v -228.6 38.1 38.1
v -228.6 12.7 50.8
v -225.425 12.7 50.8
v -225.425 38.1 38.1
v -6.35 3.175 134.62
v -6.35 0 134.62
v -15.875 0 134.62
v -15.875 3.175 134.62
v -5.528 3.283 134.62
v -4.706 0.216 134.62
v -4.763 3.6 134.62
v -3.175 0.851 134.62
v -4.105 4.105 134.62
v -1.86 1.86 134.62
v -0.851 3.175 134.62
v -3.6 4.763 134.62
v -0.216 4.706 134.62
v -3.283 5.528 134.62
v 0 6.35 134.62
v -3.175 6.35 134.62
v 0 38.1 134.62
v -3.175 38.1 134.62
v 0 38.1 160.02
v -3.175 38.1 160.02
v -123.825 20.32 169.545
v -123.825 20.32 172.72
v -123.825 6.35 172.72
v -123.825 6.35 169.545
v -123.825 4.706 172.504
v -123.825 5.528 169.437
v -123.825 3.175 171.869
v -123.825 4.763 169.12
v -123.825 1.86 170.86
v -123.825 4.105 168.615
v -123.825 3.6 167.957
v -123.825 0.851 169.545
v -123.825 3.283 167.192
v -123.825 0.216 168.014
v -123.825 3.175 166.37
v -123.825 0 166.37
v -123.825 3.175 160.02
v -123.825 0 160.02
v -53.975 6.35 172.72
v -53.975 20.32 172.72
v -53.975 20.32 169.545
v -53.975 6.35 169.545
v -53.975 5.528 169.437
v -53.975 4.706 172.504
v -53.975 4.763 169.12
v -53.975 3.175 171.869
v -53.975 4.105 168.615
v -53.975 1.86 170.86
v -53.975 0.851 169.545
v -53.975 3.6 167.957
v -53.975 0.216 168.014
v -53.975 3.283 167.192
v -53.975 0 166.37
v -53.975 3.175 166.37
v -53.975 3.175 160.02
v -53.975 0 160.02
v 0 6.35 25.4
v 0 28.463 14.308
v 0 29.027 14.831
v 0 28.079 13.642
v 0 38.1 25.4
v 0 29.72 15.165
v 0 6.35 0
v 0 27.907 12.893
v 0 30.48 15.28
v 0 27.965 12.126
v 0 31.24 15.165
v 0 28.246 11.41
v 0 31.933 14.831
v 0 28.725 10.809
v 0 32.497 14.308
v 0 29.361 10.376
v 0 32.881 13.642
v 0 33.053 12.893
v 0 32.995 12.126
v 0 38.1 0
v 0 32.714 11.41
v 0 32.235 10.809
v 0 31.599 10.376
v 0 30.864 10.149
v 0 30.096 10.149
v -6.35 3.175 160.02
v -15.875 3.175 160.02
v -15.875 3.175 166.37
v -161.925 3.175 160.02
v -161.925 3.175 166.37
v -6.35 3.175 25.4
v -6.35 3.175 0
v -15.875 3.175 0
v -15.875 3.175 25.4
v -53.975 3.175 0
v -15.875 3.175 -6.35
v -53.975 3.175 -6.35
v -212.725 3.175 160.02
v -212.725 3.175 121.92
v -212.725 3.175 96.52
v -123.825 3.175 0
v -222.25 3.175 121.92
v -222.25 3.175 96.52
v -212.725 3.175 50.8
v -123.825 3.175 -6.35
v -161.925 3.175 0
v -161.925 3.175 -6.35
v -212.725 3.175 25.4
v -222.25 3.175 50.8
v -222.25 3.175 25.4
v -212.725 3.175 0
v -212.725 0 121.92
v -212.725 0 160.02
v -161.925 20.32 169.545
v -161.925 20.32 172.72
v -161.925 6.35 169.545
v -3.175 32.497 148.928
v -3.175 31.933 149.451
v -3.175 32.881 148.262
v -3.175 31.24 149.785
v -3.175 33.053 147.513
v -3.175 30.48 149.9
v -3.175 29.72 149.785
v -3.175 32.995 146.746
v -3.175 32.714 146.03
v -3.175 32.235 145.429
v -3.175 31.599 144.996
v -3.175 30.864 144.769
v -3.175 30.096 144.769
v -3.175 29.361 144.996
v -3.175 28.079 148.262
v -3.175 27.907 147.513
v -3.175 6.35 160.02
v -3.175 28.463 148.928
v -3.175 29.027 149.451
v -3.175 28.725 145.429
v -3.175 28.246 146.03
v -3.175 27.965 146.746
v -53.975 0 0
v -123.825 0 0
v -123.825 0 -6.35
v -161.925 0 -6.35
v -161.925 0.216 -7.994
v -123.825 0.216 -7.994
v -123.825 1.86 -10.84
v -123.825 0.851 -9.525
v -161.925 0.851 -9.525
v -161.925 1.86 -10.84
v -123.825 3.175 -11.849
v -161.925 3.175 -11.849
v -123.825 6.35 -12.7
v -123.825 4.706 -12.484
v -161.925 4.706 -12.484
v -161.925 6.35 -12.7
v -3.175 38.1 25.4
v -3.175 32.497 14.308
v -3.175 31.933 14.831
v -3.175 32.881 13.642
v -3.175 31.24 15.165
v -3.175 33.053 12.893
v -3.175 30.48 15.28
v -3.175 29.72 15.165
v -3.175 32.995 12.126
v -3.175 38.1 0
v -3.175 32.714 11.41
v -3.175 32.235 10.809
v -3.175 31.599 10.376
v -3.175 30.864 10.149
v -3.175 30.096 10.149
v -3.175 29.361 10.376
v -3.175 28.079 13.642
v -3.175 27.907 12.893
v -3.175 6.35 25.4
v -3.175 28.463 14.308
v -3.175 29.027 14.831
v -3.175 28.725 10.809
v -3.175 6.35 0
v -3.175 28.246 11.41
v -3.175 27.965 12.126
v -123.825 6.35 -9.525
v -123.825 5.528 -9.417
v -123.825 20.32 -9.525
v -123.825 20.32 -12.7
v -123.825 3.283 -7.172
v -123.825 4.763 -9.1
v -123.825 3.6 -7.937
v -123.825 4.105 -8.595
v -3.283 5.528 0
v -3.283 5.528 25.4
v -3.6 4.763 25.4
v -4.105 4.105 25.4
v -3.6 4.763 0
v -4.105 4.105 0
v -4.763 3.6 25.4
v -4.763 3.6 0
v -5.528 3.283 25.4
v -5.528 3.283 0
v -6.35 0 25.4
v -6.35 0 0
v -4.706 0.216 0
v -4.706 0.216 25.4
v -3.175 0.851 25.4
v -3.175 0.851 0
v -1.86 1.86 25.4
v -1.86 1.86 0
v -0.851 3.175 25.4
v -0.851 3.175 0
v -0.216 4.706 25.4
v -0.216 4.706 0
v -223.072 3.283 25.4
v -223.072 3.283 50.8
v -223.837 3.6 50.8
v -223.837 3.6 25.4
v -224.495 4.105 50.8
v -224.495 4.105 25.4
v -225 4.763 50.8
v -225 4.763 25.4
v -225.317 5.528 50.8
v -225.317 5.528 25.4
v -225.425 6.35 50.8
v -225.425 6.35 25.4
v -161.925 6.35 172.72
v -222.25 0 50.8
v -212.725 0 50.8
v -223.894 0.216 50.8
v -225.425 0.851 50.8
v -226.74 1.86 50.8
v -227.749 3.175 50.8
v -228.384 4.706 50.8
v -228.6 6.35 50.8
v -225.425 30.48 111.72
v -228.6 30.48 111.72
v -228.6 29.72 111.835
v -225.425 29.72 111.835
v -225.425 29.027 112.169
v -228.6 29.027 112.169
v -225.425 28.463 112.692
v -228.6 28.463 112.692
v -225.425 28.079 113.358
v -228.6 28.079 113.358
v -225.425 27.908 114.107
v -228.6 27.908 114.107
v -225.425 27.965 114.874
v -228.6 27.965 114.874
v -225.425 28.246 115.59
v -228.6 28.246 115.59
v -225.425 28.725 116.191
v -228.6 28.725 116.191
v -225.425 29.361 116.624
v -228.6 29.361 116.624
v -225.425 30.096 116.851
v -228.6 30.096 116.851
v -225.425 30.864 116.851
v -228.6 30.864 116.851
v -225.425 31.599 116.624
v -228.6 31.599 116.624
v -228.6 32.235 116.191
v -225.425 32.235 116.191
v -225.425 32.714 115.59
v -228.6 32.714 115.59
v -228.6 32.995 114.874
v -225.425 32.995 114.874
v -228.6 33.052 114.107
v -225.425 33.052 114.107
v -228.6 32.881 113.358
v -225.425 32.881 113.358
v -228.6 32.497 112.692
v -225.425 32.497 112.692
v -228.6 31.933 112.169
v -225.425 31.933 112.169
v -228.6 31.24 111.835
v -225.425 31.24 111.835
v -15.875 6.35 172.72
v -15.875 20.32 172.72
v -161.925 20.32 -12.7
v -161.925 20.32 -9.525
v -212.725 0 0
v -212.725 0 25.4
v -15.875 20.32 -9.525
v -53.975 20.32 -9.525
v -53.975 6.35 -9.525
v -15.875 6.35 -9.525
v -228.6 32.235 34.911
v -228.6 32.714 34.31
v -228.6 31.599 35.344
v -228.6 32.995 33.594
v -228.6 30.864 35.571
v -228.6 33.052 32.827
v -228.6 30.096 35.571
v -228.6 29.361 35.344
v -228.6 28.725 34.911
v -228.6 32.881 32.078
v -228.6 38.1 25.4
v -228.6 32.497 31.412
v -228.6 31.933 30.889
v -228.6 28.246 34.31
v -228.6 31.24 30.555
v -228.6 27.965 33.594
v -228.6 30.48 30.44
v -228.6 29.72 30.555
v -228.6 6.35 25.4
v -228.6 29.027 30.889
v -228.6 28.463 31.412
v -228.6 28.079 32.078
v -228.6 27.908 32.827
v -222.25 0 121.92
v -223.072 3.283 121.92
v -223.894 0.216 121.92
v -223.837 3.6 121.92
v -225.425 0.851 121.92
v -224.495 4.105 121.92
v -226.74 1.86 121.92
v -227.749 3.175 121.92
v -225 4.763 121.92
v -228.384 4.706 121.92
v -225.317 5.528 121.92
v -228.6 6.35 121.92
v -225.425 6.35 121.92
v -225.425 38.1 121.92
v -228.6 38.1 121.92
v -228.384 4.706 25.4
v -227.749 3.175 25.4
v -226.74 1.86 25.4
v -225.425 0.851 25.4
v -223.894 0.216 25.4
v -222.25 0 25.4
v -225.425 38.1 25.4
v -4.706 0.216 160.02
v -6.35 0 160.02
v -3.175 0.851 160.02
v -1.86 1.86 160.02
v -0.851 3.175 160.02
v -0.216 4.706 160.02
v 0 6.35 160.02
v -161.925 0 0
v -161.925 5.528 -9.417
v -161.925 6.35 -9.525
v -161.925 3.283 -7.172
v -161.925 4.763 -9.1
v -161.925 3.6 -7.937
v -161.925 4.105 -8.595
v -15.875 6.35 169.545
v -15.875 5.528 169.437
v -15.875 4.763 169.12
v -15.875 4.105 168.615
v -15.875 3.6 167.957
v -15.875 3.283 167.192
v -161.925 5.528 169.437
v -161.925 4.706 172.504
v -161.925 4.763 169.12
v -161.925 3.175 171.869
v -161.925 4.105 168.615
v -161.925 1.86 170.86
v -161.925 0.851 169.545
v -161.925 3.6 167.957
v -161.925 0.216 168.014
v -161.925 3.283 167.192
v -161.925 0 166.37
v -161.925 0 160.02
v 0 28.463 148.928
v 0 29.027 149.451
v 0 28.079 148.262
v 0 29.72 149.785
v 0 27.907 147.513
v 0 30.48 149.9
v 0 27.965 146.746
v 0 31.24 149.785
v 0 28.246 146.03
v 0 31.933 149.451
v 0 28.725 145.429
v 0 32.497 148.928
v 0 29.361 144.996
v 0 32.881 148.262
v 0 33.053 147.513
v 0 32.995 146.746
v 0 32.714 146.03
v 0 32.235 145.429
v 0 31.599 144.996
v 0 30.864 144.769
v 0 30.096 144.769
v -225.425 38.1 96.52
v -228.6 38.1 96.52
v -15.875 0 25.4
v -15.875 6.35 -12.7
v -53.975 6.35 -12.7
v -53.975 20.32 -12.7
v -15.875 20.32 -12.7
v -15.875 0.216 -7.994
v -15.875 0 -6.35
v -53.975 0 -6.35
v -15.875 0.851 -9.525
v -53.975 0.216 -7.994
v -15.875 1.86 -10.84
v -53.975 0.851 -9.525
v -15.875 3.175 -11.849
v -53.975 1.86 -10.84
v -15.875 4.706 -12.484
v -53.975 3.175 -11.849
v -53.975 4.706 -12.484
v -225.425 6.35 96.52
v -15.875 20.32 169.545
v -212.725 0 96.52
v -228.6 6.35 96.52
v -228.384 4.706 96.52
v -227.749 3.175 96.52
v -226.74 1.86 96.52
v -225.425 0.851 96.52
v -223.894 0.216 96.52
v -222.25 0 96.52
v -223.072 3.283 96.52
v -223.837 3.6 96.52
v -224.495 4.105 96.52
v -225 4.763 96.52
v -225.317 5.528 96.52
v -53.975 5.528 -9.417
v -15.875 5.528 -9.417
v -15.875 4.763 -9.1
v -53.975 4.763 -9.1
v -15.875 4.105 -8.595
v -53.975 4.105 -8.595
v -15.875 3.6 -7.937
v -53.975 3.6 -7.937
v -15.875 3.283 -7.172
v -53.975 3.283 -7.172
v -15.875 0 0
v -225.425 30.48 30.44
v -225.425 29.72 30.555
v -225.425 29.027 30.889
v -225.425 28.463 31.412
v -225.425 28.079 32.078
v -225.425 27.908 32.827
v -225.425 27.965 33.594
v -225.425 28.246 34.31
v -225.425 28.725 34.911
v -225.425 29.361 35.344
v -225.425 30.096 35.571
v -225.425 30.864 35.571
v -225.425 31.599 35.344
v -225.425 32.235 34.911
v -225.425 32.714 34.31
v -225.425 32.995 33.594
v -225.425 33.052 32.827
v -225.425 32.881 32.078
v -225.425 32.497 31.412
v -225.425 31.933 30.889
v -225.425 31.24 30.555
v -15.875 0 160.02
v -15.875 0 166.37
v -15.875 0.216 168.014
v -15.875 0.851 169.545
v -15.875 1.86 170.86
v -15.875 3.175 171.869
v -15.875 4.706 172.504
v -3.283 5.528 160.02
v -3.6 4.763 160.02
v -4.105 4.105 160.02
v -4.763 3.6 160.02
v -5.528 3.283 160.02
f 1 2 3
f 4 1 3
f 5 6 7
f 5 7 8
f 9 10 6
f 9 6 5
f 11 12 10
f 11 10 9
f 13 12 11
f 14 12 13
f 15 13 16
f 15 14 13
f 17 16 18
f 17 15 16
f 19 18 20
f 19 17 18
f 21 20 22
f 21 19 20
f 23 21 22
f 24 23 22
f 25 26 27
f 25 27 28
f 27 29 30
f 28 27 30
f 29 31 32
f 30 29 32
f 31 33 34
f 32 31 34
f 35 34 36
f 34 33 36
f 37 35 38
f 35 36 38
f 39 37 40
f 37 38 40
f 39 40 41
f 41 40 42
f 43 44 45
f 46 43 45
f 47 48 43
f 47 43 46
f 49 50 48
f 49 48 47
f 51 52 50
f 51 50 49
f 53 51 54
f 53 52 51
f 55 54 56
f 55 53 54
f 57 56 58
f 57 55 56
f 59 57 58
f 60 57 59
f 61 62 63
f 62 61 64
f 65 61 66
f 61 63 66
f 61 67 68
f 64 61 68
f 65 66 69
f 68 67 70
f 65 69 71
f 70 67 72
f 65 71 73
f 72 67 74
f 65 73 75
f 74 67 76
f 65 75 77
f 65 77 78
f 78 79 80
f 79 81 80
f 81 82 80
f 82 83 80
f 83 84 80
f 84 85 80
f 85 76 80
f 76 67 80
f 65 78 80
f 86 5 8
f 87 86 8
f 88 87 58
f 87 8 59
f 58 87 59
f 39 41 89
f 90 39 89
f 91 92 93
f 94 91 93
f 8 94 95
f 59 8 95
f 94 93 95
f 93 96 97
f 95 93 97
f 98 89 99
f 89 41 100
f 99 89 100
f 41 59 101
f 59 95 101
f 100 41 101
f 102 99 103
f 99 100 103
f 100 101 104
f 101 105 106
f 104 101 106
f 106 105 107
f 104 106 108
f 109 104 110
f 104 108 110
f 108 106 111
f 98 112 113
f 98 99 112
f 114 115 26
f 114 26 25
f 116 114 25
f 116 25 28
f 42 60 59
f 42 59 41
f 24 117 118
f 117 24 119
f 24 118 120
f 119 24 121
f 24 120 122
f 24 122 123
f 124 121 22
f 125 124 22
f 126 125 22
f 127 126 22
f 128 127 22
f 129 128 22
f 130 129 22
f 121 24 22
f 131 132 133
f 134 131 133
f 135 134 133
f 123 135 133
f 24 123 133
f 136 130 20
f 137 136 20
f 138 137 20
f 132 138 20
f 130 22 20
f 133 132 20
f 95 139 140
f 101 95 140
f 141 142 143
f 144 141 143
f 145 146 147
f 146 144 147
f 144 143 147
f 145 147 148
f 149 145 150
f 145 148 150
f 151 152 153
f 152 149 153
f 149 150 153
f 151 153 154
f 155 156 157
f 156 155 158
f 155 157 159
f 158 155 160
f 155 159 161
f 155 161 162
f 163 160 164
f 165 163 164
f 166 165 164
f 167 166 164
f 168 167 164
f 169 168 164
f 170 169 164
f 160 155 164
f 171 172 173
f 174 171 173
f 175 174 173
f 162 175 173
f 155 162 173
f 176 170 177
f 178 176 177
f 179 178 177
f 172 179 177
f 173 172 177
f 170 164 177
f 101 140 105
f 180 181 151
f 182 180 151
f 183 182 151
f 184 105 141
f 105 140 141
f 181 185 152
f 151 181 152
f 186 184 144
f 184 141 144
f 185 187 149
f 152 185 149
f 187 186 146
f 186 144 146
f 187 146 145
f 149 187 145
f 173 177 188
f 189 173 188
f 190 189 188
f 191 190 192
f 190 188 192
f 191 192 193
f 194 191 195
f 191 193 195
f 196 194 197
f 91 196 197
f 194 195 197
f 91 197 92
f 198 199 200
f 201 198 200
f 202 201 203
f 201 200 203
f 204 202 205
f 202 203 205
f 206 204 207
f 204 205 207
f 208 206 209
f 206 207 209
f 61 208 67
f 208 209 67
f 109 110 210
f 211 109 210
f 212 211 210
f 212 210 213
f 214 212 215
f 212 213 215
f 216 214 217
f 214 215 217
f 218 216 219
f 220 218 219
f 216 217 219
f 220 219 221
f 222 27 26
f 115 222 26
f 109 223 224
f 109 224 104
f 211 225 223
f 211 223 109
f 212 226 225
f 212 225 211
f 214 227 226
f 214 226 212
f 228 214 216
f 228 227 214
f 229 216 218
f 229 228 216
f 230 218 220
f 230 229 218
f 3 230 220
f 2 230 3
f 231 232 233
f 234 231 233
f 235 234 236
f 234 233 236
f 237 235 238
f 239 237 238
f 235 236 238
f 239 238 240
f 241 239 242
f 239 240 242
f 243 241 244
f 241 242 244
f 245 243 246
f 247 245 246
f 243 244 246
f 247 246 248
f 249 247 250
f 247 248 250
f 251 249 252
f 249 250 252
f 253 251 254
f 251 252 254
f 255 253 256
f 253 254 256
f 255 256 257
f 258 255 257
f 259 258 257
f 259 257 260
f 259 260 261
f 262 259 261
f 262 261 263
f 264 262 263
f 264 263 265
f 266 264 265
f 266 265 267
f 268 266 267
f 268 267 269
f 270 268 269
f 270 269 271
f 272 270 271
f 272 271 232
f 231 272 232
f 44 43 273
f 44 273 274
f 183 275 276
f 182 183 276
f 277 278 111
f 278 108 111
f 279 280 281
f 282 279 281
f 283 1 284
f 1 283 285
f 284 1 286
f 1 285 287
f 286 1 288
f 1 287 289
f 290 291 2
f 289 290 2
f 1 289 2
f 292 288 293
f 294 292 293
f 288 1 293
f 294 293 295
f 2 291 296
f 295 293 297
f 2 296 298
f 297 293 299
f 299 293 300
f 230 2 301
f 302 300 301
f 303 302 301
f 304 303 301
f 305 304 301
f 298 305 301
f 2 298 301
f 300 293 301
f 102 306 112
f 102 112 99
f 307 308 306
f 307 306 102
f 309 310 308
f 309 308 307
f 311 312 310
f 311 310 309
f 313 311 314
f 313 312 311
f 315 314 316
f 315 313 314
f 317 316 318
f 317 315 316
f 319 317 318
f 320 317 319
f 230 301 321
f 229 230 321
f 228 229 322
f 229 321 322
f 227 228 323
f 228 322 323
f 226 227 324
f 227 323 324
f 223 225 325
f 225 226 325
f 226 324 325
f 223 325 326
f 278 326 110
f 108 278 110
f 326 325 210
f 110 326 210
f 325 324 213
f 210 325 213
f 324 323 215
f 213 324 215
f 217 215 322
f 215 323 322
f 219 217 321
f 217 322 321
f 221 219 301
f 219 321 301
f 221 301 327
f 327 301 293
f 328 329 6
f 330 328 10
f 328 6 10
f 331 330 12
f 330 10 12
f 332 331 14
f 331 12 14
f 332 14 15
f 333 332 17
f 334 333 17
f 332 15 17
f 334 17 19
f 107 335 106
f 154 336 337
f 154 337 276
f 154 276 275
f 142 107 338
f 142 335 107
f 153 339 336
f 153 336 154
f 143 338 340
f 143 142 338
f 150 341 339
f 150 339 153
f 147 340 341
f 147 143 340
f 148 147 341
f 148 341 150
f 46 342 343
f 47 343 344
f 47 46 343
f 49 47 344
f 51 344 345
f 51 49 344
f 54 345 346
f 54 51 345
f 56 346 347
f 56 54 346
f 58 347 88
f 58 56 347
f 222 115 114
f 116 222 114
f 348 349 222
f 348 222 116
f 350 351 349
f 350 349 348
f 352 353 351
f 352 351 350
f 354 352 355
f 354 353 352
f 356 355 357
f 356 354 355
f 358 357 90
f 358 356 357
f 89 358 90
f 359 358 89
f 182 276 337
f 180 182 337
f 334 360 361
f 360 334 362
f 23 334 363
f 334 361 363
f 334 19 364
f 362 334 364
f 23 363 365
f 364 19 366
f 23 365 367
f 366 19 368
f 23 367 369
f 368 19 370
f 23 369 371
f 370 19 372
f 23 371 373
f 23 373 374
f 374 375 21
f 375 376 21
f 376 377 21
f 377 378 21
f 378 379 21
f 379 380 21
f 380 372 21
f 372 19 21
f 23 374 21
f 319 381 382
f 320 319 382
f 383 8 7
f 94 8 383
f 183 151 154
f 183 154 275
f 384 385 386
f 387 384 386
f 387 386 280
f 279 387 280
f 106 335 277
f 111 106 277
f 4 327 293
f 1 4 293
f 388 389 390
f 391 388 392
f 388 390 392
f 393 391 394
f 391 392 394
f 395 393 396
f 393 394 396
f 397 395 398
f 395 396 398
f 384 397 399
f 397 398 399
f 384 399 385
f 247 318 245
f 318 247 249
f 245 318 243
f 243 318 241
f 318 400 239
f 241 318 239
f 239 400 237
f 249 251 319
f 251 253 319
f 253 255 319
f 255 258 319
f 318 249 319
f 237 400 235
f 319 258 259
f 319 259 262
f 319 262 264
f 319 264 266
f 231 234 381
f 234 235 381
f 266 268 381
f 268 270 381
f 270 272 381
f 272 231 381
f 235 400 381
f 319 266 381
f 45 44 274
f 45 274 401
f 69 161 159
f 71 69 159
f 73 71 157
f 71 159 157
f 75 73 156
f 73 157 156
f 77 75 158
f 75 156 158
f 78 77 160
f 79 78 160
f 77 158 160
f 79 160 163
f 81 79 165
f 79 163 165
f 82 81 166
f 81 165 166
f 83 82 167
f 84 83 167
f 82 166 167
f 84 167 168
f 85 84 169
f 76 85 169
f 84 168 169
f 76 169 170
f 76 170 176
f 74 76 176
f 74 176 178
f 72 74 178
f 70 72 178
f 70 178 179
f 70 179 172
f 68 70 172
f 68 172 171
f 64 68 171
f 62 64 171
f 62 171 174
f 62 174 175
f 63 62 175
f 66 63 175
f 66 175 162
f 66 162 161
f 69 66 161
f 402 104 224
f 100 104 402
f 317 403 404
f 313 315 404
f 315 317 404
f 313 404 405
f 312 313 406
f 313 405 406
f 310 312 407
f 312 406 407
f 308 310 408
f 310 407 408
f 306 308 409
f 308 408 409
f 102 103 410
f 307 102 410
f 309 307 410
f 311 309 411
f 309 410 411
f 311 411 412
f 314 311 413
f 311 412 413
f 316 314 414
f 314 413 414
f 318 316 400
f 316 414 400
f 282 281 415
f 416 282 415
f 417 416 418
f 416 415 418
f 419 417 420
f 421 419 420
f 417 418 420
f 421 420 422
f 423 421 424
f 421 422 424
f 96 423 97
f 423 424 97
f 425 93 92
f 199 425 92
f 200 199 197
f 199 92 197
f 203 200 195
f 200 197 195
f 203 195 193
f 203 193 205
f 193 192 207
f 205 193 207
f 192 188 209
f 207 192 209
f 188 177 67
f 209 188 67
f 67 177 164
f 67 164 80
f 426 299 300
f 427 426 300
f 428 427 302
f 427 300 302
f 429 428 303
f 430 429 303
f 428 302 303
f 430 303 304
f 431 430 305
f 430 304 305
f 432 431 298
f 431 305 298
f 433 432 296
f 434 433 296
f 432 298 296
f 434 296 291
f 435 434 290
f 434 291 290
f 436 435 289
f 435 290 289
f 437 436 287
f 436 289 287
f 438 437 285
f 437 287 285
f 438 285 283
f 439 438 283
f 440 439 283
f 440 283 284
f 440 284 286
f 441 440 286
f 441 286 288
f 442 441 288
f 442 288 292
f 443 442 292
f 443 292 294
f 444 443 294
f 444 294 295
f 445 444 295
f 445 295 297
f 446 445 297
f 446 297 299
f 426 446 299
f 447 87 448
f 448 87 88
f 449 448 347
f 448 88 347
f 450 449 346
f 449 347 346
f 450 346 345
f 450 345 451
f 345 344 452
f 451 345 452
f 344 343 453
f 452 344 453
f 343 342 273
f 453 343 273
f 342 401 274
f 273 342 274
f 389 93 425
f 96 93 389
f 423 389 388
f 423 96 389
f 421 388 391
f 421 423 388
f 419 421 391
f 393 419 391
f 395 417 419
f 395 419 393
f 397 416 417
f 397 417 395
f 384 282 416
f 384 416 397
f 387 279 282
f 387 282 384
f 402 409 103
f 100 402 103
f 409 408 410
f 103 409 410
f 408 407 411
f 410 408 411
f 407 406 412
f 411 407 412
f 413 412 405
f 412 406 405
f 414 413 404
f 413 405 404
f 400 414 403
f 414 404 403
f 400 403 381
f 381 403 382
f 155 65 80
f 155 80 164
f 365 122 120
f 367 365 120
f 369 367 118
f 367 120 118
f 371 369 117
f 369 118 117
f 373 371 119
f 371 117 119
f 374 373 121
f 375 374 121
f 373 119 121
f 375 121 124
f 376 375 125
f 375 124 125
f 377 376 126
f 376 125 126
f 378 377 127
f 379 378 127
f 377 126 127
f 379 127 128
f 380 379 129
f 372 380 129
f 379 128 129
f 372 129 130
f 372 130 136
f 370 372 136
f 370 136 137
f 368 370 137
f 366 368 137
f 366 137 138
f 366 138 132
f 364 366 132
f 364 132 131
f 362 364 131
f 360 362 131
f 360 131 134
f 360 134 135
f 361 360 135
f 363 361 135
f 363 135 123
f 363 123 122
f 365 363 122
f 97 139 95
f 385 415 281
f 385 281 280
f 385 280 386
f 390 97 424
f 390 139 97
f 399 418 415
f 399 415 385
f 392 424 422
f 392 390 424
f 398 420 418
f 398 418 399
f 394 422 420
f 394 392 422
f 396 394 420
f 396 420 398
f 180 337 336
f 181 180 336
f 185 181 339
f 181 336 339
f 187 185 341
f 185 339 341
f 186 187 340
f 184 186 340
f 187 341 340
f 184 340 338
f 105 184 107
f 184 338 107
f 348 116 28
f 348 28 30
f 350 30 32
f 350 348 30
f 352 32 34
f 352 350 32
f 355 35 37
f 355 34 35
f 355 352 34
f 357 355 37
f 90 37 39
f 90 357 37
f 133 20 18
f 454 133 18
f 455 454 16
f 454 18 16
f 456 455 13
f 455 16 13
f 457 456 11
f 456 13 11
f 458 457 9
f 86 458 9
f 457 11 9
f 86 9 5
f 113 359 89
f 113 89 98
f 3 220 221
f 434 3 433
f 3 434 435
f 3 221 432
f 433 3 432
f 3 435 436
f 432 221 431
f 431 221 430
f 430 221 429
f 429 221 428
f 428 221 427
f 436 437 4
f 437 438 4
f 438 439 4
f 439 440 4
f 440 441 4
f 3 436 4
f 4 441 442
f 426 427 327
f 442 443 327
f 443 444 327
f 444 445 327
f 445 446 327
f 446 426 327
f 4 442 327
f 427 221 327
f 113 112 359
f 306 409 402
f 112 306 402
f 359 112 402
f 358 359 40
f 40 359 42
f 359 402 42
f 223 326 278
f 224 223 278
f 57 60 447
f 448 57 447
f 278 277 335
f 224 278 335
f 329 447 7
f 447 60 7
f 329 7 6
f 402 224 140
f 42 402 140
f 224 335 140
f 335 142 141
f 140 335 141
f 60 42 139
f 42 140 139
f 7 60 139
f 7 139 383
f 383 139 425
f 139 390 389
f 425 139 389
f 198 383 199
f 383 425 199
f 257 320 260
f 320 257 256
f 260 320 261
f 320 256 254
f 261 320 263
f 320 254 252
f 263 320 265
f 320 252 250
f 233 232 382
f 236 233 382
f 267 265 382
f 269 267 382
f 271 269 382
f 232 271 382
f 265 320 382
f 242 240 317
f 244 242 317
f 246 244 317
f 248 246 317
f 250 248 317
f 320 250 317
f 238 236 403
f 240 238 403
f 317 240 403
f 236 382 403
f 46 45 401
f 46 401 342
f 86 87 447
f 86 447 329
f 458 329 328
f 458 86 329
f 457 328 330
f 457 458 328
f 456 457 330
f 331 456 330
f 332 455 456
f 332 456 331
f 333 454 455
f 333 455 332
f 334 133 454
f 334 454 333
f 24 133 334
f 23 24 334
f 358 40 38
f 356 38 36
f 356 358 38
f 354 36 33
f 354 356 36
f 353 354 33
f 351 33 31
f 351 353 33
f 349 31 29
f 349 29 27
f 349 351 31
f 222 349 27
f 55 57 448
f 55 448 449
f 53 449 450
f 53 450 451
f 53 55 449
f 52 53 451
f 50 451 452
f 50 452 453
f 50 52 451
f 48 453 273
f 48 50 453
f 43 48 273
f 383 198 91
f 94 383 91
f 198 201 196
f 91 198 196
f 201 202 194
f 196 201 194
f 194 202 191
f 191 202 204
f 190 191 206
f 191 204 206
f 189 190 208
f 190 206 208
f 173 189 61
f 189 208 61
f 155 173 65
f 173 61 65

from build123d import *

# Parameters (mm, degrees)
BASE_FLANGE1_DEPTH               = 160.02
SKETCH17_W                       = 196.85
SKETCH17_H                       = 12.7
BOSS_EXTRUDE2_DEPTH              = 3.175
EDGE_FLANGE1_STRIP_W             = 19.05
EDGE_FLANGE1_STRIP_H             = 3.175
EDGE_FLANGE1_STRIP_CUT_DEPTH     = 196.85
EDGE_FLANGE1_DEPTH               = 196.85
CUT_EXTRUDE3_REACH               = 291.036
SKETCH24_R                       = 2.5796875
SKETCH24_W                       = 45.72
SKETCH24_H                       = 50.8
SKETCH24_W_2                     = 38.1
SKETCH24_W_3                     = 25.4
F_13_64_0_20313_DIAMETER_HOLE1_D = 5.159502
CUT_EXTRUDE4_REACH               = 291.036
SKETCH28_W                       = 109.22
SKETCH28_H                       = 50.8
SKETCH29_W                       = 69.85
SKETCH29_H                       = 12.7
SKETCH29_W_2                     = 50.8
CUT_EXTRUDE5_DEPTH               = 290.035929254
CHAMFER1_SIZE                    = 12.7
CHAMFER1_SIZE2                   = 25.4


# Sheet-metal steps are written as plain solids
with BuildPart() as part:
    # Sketch7 → Base-Flange1 (new body)
    with BuildSketch(Plane.XY):
        with BuildLine():
            Line((-228.6, 38.1), (-228.6, 6.35))
            ThreePointArc((-228.6, 6.35), (-226.740128061, 1.859871939), (-222.25, 0))
            Line((-222.25, 0), (-6.35, 0))
            ThreePointArc((-6.35, 0), (-1.859871939, 1.859871939), (0, 6.35))
            Line((0, 6.35), (0, 38.1))
            Line((0, 38.1), (-3.175, 38.1))
            Line((-3.175, 38.1), (-3.175, 6.35))
            ThreePointArc((-3.175, 6.35), (-4.10493597, 4.10493597), (-6.35, 3.175))
            Line((-6.35, 3.175), (-222.25, 3.175))
            ThreePointArc((-222.25, 3.175), (-224.49506403, 4.10493597), (-225.425, 6.35))
            Line((-225.425, 6.35), (-225.425, 38.1))
            Line((-225.425, 38.1), (-228.6, 38.1))
        make_face()
    extrude(amount=BASE_FLANGE1_DEPTH)

    # Sketch17 → Boss-Extrude2 (add)
    with BuildSketch(Plane(origin=(0, 3.175, 0), x_dir=(1, 0, 0), z_dir=(0, 1, 0))):
        with Locations((-114.3, -166.37)):
            Rectangle(SKETCH17_W, SKETCH17_H)
    boss_extrude2 = extrude(amount=-BOSS_EXTRUDE2_DEPTH)

    # Edge-Flange1 strip (across the edge) → Edge-Flange1 strip cut (cut)
    with BuildSketch(Plane(origin=(-212.725, 3.175, 172.72), x_dir=(0, 0, -1), z_dir=(1, 0, 0))):
        with Locations((-3.175, -1.5875)):
            Rectangle(EDGE_FLANGE1_STRIP_W, EDGE_FLANGE1_STRIP_H)
    edge_flange1_strip_cut = extrude(amount=EDGE_FLANGE1_STRIP_CUT_DEPTH, mode=Mode.SUBTRACT)

    # Edge-Flange1 section (across the edge) → Edge-Flange1 (add)
    with BuildSketch(Plane(origin=(-212.725, 3.175, 172.72), x_dir=(0, 0, -1), z_dir=(1, 0, 0))):
        with BuildLine():
            Line((0, 3.175), (0, 17.145))
            Line((0, 17.145), (3.175, 17.145))
            Line((3.175, 17.145), (3.175, 3.175))
            ThreePointArc((3.175, 3.175), (4.10493597, 0.92993597), (6.35, 0))
            Line((6.35, 0), (6.35, -3.175))
            ThreePointArc((6.35, -3.175), (1.859871939, -1.315128061), (0, 3.175))
        make_face()
    edge_flange1 = extrude(amount=EDGE_FLANGE1_DEPTH)

    # Mirror1: Boss-Extrude2, Edge-Flange1 strip cut, Edge-Flange1 across plane
    add(boss_extrude2.mirror(Plane.XY.offset(80.01)))
    add(edge_flange1_strip_cut.mirror(Plane.XY.offset(80.01)), mode=Mode.SUBTRACT)
    add(edge_flange1.mirror(Plane.XY.offset(80.01)))

    # Cut-Extrude3: up to this face of the body (flat: up to its plane)
    cut_extrude3_end = Plane(part.part.faces().sort_by_distance((-212.725, 2.935376879, 163.195))[0])
    # Sketch24 → Cut-Extrude3 (cut, up to the picked face)
    with BuildSketch(Plane.ZY.offset(228.6), mode=Mode.PRIVATE) as cut_extrude3_sk1:
        with Locations(Location((33.02, 30.48, 0), (0, 0, 180))):
            Circle(SKETCH24_R)
    cut_extrude3_tool1 = split(extrude(cut_extrude3_sk1.sketch, amount=-CUT_EXTRUDE3_REACH, mode=Mode.PRIVATE), bisect_by=cut_extrude3_end, keep=Keep.BOTH, mode=Mode.PRIVATE)
    # Sketch24 → Cut-Extrude3 (cut, up to the picked face)
    with BuildSketch(Plane.ZY.offset(228.6), mode=Mode.PRIVATE) as cut_extrude3_sk2:
        with Locations(Location((114.3, 30.48, 0), (0, 0, 180))):
            Circle(SKETCH24_R)
    cut_extrude3_tool2 = split(extrude(cut_extrude3_sk2.sketch, amount=-CUT_EXTRUDE3_REACH, mode=Mode.PRIVATE), bisect_by=cut_extrude3_end, keep=Keep.BOTH, mode=Mode.PRIVATE)
    # Sketch24 → Cut-Extrude3 (cut, up to the picked face)
    with BuildSketch(Plane.ZY.offset(228.6), mode=Mode.PRIVATE) as cut_extrude3_sk3:
        with Locations((73.66, 12.7)):
            Rectangle(SKETCH24_W, SKETCH24_H)
    cut_extrude3_tool3 = split(extrude(cut_extrude3_sk3.sketch, amount=-CUT_EXTRUDE3_REACH, mode=Mode.PRIVATE), bisect_by=cut_extrude3_end, keep=Keep.BOTH, mode=Mode.PRIVATE)
    # Sketch24 → Cut-Extrude3 (cut, up to the picked face)
    with BuildSketch(Plane.ZY.offset(228.6), mode=Mode.PRIVATE) as cut_extrude3_sk4:
        with Locations((140.97, 12.7)):
            Rectangle(SKETCH24_W_2, SKETCH24_H)
    cut_extrude3_tool4 = split(extrude(cut_extrude3_sk4.sketch, amount=-CUT_EXTRUDE3_REACH, mode=Mode.PRIVATE), bisect_by=cut_extrude3_end, keep=Keep.BOTH, mode=Mode.PRIVATE)
    # Sketch24 → Cut-Extrude3 (cut, up to the picked face)
    with BuildSketch(Plane.ZY.offset(228.6), mode=Mode.PRIVATE) as cut_extrude3_sk5:
        with Locations((12.7, 12.7)):
            Rectangle(SKETCH24_W_3, SKETCH24_H)
    cut_extrude3_tool5 = split(extrude(cut_extrude3_sk5.sketch, amount=-CUT_EXTRUDE3_REACH, mode=Mode.PRIVATE), bisect_by=cut_extrude3_end, keep=Keep.BOTH, mode=Mode.PRIVATE)
    add(cut_extrude3_tool1.solids().sort_by(Axis((-228.6, 30.48, 33.02), (1, 0, 0)))[0], mode=Mode.SUBTRACT)
    add(cut_extrude3_tool2.solids().sort_by(Axis((-228.6, 30.48, 114.3), (1, 0, 0)))[0], mode=Mode.SUBTRACT)
    add(cut_extrude3_tool3.solids().sort_by(Axis((-228.6, 12.7, 73.66), (1, 0, 0)))[0], mode=Mode.SUBTRACT)
    add(cut_extrude3_tool4.solids().sort_by(Axis((-228.6, 12.7, 140.97), (1, 0, 0)))[0], mode=Mode.SUBTRACT)
    add(cut_extrude3_tool5.solids().sort_by(Axis((-228.6, 12.7, 12.7), (1, 0, 0)))[0], mode=Mode.SUBTRACT)

    # 13/64 (0.20313) Diameter Hole1 (through all)
    with Locations(Plane(origin=(0, 0, 0), x_dir=(0, 0, -1), z_dir=(1, 0, 0))):
        with Locations((-147.32, 30.48), (-12.7, 30.48)):
            Hole(F_13_64_0_20313_DIAMETER_HOLE1_D / 2)

    # Cut-Extrude4: up to this face of the body (flat: up to its plane)
    cut_extrude4_end = Plane(part.part.faces().sort_by_distance((-15.875, 2.935376879, -3.175))[0])
    # Sketch28 → Cut-Extrude4 (cut, up to the picked face)
    with BuildSketch(Plane(origin=(0, 0, 0), x_dir=(0, 0, -1), z_dir=(1, 0, 0)), mode=Mode.PRIVATE) as cut_extrude4_sk1:
        with Locations((-80.01, 12.7)):
            Rectangle(SKETCH28_W, SKETCH28_H)
    cut_extrude4_tool1 = split(extrude(cut_extrude4_sk1.sketch, amount=-CUT_EXTRUDE4_REACH, mode=Mode.PRIVATE), bisect_by=cut_extrude4_end, keep=Keep.BOTH, mode=Mode.PRIVATE)
    add(cut_extrude4_tool1.solids().sort_by(Axis((0, 12.7, 80.01), (-1, 0, 0)))[0], mode=Mode.SUBTRACT)

    # Sketch29 → Cut-Extrude5 (cut, through all)
    with BuildSketch(Plane(origin=(0, 0, 0), x_dir=(-1, 0, 0), z_dir=(0, -1, 0))):
        with Locations((88.9, -166.37)):
            Rectangle(SKETCH29_W, SKETCH29_H)
        with Locations((88.9, 6.35)):
            Rectangle(SKETCH29_W, SKETCH29_H)
        with Locations((187.325, -166.37)):
            Rectangle(SKETCH29_W_2, SKETCH29_H)
        with Locations((187.325, 6.35)):
            Rectangle(SKETCH29_W_2, SKETCH29_H)
    extrude(amount=-CUT_EXTRUDE5_DEPTH, mode=Mode.SUBTRACT)

    # Chamfer1
    chamfer1_edges = [part.edges().sort_by_distance(p)[0] for p in [
        (-227.0125, 38.1, 50.8),
    ]]
    chamfer1_side = [part.faces().sort_by_distance(p)[0] for p in [
        (-227.0125, 38.1, 38.1),
    ]]
    chamfer(chamfer1_edges, length=CHAMFER1_SIZE, length2=CHAMFER1_SIZE2, reference=chamfer1_side[0])


solid = part.part
